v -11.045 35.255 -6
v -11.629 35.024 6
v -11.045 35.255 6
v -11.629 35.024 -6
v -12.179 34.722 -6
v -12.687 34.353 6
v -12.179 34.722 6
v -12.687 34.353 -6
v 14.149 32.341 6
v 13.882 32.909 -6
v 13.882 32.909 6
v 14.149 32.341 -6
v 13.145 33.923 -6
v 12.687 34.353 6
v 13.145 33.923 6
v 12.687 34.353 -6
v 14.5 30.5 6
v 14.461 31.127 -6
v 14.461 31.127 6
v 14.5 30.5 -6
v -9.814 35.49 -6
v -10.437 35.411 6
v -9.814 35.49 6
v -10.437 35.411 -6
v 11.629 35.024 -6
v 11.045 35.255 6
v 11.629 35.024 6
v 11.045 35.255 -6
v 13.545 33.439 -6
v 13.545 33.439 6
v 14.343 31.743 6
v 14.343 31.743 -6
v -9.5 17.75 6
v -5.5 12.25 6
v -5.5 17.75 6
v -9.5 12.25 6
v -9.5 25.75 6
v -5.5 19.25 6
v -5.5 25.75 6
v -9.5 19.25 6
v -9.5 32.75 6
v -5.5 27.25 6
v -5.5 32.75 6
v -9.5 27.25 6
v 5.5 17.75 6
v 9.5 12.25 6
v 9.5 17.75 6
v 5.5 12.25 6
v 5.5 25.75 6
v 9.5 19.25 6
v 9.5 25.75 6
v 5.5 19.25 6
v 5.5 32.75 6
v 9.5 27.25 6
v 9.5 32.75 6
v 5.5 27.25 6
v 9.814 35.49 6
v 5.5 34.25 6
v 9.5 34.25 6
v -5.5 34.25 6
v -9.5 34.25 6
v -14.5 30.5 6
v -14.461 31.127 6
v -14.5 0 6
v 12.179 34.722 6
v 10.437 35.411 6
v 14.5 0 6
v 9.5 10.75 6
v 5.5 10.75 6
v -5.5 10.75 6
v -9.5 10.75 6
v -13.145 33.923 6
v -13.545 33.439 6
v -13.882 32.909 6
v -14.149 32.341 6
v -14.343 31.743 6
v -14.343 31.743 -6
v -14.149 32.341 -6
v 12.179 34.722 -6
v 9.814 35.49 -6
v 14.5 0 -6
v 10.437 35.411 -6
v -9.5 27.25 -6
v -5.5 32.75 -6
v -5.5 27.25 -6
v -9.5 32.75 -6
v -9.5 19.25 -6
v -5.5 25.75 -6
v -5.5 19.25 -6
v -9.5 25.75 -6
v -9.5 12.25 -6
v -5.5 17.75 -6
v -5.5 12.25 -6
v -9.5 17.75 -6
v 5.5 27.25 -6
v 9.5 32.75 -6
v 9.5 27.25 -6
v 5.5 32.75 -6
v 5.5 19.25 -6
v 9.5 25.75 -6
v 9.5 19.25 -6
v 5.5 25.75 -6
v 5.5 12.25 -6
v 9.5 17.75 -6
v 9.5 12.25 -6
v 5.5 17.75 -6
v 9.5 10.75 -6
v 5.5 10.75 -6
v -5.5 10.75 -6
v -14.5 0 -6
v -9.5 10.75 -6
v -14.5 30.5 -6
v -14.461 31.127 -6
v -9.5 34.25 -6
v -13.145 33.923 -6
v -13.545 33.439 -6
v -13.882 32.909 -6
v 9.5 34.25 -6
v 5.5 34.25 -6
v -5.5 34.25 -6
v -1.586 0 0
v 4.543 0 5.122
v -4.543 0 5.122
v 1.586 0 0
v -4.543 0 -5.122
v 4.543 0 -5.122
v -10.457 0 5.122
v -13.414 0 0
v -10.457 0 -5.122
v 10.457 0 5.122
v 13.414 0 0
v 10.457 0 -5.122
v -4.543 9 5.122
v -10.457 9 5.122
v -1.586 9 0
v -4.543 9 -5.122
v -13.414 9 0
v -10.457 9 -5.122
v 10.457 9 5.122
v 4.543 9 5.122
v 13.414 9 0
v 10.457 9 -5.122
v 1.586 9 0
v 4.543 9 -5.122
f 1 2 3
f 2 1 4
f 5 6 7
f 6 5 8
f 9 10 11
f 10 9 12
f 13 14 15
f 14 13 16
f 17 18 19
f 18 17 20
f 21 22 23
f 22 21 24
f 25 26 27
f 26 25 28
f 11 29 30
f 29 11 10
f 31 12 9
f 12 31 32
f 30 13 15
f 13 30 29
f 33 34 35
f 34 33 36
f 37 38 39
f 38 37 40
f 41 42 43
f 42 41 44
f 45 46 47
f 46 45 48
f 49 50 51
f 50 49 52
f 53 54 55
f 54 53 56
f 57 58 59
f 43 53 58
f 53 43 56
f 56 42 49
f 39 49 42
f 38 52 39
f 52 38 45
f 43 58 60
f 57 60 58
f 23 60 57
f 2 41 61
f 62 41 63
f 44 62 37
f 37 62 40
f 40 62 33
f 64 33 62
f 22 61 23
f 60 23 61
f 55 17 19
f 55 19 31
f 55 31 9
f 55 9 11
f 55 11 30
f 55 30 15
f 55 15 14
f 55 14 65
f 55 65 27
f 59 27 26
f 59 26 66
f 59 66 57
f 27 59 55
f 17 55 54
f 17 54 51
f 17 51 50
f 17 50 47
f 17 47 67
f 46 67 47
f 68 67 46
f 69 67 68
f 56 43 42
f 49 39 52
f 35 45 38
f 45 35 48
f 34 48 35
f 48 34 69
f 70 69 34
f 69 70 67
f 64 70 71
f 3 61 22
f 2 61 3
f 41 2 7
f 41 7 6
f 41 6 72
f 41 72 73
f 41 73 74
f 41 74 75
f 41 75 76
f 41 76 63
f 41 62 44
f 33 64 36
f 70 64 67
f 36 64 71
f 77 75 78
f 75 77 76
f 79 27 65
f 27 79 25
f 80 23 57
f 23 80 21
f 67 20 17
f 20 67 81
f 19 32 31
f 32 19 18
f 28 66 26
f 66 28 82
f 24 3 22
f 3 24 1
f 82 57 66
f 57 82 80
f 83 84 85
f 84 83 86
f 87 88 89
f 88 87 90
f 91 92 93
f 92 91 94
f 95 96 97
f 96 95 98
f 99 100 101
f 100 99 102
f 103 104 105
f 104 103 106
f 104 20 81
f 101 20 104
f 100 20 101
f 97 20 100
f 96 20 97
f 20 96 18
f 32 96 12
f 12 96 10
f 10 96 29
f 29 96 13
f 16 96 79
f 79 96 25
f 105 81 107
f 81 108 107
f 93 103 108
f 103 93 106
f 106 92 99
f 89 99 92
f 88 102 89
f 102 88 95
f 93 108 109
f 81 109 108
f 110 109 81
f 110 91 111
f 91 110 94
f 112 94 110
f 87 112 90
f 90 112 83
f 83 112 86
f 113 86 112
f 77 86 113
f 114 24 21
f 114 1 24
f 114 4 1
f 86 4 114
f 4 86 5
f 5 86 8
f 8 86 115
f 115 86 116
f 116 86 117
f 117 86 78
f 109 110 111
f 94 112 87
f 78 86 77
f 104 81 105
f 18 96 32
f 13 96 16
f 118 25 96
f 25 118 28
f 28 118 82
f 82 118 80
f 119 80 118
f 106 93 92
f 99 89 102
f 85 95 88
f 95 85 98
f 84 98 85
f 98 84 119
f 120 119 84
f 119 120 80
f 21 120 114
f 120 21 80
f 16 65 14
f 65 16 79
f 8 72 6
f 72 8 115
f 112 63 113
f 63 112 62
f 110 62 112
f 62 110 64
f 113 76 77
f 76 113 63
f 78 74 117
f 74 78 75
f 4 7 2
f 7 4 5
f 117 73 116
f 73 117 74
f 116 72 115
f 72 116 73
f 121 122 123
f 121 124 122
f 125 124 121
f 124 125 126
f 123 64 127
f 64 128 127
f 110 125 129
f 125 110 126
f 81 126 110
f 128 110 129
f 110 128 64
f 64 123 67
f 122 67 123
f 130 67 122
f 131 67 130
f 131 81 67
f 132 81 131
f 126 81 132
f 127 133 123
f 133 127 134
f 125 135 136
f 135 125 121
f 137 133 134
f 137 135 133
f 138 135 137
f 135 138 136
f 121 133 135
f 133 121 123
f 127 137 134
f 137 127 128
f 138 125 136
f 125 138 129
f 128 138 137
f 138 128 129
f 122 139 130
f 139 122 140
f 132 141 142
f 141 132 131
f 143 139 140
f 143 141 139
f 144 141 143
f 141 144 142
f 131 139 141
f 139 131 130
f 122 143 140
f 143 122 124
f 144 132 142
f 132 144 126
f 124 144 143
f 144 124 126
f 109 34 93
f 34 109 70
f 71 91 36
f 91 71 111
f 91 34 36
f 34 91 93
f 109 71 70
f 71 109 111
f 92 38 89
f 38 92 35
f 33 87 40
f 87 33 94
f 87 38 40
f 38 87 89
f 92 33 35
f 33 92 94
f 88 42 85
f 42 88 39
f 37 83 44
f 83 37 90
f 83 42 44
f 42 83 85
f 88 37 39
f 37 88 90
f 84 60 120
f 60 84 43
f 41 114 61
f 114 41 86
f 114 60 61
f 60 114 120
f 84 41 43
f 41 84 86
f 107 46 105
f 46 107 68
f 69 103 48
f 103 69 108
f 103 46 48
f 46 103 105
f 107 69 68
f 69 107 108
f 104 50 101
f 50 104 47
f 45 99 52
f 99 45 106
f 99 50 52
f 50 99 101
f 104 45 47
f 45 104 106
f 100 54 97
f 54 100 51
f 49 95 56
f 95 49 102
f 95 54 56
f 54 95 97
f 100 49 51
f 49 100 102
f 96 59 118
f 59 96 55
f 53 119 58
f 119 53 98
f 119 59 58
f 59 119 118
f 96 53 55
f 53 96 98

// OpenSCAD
$fn = 50;


difference() {
	union() {
		translate(v = [0, 21.0000000000, -6.0000000000]) {
			hull() {
				translate(v = [-9.5000000000, 9.5000000000, 0]) {
					cylinder(h = 12, r = 5);
				}
				translate(v = [9.5000000000, 9.5000000000, 0]) {
					cylinder(h = 12, r = 5);
				}
				translate(v = [-9.5000000000, -9.5000000000, 0]) {
					cylinder(h = 12, r = 5);
				}
				translate(v = [9.5000000000, -9.5000000000, 0]) {
					cylinder(h = 12, r = 5);
				}
			}
		}
		translate(v = [0, 21.0000000000, -6.0000000000]) {
			hull() {
				translate(v = [-9.5000000000, 9.5000000000, 0]) {
					cylinder(h = 12, r = 5);
				}
				translate(v = [9.5000000000, 9.5000000000, 0]) {
					cylinder(h = 12, r = 5);
				}
				translate(v = [-9.5000000000, -9.5000000000, 0]) {
					cylinder(h = 12, r = 5);
				}
				translate(v = [9.5000000000, -9.5000000000, 0]) {
					cylinder(h = 12, r = 5);
				}
			}
		}
		translate(v = [-14.5000000000, 0, -6.0000000000]) {
			cube(size = [29, 13.5000000000, 12]);
		}
	}
	union() {
		translate(v = [-7.5000000000, 9, 0]) {
			rotate(a = [0, 0, 0]) {
				difference() {
					union() {
						rotate(a = [90, 0, 0]) {
							linear_extrude(height = 13.5000000000) {
								polygon(points = [[5.9142500000, 0.0000000000], [2.9571250000, 5.1218907443], [-2.9571250000, 5.1218907443], [-5.9142500000, 0.0000000000], [-2.9571250000, -5.1218907443], [2.9571250000, -5.1218907443]]);
							}
						}
					}
					union();
				}
			}
		}
		translate(v = [7.5000000000, 9, 0]) {
			rotate(a = [0, 0, 0]) {
				difference() {
					union() {
						rotate(a = [90, 0, 0]) {
							linear_extrude(height = 13.5000000000) {
								polygon(points = [[5.9142500000, 0.0000000000], [2.9571250000, 5.1218907443], [-2.9571250000, 5.1218907443], [-5.9142500000, 0.0000000000], [-2.9571250000, -5.1218907443], [2.9571250000, -5.1218907443]]);
							}
						}
					}
					union();
				}
			}
		}
		translate(v = [-9.5000000000, 10.7500000000, -50]) {
			cube(size = [4, 1.5000000000, 100]);
		}
		translate(v = [-9.5000000000, 17.7500000000, -50]) {
			cube(size = [4, 1.5000000000, 100]);
		}
		translate(v = [-9.5000000000, 25.7500000000, -50]) {
			cube(size = [4, 1.5000000000, 100]);
		}
		translate(v = [-9.5000000000, 32.7500000000, -50]) {
			cube(size = [4, 1.5000000000, 100]);
		}
		translate(v = [-7.5000000000, 8, 0]) {
			rotate(a = [90, 0, 0]) {
				cylinder(h = 8, r = 3.2500000000);
			}
		}
		translate(v = [5.5000000000, 10.7500000000, -50]) {
			cube(size = [4, 1.5000000000, 100]);
		}
		translate(v = [5.5000000000, 17.7500000000, -50]) {
			cube(size = [4, 1.5000000000, 100]);
		}
		translate(v = [5.5000000000, 25.7500000000, -50]) {
			cube(size = [4, 1.5000000000, 100]);
		}
		translate(v = [5.5000000000, 32.7500000000, -50]) {
			cube(size = [4, 1.5000000000, 100]);
		}
		translate(v = [7.5000000000, 8, 0]) {
			rotate(a = [90, 0, 0]) {
				cylinder(h = 8, r = 3.2500000000);
			}
		}
	}
}
